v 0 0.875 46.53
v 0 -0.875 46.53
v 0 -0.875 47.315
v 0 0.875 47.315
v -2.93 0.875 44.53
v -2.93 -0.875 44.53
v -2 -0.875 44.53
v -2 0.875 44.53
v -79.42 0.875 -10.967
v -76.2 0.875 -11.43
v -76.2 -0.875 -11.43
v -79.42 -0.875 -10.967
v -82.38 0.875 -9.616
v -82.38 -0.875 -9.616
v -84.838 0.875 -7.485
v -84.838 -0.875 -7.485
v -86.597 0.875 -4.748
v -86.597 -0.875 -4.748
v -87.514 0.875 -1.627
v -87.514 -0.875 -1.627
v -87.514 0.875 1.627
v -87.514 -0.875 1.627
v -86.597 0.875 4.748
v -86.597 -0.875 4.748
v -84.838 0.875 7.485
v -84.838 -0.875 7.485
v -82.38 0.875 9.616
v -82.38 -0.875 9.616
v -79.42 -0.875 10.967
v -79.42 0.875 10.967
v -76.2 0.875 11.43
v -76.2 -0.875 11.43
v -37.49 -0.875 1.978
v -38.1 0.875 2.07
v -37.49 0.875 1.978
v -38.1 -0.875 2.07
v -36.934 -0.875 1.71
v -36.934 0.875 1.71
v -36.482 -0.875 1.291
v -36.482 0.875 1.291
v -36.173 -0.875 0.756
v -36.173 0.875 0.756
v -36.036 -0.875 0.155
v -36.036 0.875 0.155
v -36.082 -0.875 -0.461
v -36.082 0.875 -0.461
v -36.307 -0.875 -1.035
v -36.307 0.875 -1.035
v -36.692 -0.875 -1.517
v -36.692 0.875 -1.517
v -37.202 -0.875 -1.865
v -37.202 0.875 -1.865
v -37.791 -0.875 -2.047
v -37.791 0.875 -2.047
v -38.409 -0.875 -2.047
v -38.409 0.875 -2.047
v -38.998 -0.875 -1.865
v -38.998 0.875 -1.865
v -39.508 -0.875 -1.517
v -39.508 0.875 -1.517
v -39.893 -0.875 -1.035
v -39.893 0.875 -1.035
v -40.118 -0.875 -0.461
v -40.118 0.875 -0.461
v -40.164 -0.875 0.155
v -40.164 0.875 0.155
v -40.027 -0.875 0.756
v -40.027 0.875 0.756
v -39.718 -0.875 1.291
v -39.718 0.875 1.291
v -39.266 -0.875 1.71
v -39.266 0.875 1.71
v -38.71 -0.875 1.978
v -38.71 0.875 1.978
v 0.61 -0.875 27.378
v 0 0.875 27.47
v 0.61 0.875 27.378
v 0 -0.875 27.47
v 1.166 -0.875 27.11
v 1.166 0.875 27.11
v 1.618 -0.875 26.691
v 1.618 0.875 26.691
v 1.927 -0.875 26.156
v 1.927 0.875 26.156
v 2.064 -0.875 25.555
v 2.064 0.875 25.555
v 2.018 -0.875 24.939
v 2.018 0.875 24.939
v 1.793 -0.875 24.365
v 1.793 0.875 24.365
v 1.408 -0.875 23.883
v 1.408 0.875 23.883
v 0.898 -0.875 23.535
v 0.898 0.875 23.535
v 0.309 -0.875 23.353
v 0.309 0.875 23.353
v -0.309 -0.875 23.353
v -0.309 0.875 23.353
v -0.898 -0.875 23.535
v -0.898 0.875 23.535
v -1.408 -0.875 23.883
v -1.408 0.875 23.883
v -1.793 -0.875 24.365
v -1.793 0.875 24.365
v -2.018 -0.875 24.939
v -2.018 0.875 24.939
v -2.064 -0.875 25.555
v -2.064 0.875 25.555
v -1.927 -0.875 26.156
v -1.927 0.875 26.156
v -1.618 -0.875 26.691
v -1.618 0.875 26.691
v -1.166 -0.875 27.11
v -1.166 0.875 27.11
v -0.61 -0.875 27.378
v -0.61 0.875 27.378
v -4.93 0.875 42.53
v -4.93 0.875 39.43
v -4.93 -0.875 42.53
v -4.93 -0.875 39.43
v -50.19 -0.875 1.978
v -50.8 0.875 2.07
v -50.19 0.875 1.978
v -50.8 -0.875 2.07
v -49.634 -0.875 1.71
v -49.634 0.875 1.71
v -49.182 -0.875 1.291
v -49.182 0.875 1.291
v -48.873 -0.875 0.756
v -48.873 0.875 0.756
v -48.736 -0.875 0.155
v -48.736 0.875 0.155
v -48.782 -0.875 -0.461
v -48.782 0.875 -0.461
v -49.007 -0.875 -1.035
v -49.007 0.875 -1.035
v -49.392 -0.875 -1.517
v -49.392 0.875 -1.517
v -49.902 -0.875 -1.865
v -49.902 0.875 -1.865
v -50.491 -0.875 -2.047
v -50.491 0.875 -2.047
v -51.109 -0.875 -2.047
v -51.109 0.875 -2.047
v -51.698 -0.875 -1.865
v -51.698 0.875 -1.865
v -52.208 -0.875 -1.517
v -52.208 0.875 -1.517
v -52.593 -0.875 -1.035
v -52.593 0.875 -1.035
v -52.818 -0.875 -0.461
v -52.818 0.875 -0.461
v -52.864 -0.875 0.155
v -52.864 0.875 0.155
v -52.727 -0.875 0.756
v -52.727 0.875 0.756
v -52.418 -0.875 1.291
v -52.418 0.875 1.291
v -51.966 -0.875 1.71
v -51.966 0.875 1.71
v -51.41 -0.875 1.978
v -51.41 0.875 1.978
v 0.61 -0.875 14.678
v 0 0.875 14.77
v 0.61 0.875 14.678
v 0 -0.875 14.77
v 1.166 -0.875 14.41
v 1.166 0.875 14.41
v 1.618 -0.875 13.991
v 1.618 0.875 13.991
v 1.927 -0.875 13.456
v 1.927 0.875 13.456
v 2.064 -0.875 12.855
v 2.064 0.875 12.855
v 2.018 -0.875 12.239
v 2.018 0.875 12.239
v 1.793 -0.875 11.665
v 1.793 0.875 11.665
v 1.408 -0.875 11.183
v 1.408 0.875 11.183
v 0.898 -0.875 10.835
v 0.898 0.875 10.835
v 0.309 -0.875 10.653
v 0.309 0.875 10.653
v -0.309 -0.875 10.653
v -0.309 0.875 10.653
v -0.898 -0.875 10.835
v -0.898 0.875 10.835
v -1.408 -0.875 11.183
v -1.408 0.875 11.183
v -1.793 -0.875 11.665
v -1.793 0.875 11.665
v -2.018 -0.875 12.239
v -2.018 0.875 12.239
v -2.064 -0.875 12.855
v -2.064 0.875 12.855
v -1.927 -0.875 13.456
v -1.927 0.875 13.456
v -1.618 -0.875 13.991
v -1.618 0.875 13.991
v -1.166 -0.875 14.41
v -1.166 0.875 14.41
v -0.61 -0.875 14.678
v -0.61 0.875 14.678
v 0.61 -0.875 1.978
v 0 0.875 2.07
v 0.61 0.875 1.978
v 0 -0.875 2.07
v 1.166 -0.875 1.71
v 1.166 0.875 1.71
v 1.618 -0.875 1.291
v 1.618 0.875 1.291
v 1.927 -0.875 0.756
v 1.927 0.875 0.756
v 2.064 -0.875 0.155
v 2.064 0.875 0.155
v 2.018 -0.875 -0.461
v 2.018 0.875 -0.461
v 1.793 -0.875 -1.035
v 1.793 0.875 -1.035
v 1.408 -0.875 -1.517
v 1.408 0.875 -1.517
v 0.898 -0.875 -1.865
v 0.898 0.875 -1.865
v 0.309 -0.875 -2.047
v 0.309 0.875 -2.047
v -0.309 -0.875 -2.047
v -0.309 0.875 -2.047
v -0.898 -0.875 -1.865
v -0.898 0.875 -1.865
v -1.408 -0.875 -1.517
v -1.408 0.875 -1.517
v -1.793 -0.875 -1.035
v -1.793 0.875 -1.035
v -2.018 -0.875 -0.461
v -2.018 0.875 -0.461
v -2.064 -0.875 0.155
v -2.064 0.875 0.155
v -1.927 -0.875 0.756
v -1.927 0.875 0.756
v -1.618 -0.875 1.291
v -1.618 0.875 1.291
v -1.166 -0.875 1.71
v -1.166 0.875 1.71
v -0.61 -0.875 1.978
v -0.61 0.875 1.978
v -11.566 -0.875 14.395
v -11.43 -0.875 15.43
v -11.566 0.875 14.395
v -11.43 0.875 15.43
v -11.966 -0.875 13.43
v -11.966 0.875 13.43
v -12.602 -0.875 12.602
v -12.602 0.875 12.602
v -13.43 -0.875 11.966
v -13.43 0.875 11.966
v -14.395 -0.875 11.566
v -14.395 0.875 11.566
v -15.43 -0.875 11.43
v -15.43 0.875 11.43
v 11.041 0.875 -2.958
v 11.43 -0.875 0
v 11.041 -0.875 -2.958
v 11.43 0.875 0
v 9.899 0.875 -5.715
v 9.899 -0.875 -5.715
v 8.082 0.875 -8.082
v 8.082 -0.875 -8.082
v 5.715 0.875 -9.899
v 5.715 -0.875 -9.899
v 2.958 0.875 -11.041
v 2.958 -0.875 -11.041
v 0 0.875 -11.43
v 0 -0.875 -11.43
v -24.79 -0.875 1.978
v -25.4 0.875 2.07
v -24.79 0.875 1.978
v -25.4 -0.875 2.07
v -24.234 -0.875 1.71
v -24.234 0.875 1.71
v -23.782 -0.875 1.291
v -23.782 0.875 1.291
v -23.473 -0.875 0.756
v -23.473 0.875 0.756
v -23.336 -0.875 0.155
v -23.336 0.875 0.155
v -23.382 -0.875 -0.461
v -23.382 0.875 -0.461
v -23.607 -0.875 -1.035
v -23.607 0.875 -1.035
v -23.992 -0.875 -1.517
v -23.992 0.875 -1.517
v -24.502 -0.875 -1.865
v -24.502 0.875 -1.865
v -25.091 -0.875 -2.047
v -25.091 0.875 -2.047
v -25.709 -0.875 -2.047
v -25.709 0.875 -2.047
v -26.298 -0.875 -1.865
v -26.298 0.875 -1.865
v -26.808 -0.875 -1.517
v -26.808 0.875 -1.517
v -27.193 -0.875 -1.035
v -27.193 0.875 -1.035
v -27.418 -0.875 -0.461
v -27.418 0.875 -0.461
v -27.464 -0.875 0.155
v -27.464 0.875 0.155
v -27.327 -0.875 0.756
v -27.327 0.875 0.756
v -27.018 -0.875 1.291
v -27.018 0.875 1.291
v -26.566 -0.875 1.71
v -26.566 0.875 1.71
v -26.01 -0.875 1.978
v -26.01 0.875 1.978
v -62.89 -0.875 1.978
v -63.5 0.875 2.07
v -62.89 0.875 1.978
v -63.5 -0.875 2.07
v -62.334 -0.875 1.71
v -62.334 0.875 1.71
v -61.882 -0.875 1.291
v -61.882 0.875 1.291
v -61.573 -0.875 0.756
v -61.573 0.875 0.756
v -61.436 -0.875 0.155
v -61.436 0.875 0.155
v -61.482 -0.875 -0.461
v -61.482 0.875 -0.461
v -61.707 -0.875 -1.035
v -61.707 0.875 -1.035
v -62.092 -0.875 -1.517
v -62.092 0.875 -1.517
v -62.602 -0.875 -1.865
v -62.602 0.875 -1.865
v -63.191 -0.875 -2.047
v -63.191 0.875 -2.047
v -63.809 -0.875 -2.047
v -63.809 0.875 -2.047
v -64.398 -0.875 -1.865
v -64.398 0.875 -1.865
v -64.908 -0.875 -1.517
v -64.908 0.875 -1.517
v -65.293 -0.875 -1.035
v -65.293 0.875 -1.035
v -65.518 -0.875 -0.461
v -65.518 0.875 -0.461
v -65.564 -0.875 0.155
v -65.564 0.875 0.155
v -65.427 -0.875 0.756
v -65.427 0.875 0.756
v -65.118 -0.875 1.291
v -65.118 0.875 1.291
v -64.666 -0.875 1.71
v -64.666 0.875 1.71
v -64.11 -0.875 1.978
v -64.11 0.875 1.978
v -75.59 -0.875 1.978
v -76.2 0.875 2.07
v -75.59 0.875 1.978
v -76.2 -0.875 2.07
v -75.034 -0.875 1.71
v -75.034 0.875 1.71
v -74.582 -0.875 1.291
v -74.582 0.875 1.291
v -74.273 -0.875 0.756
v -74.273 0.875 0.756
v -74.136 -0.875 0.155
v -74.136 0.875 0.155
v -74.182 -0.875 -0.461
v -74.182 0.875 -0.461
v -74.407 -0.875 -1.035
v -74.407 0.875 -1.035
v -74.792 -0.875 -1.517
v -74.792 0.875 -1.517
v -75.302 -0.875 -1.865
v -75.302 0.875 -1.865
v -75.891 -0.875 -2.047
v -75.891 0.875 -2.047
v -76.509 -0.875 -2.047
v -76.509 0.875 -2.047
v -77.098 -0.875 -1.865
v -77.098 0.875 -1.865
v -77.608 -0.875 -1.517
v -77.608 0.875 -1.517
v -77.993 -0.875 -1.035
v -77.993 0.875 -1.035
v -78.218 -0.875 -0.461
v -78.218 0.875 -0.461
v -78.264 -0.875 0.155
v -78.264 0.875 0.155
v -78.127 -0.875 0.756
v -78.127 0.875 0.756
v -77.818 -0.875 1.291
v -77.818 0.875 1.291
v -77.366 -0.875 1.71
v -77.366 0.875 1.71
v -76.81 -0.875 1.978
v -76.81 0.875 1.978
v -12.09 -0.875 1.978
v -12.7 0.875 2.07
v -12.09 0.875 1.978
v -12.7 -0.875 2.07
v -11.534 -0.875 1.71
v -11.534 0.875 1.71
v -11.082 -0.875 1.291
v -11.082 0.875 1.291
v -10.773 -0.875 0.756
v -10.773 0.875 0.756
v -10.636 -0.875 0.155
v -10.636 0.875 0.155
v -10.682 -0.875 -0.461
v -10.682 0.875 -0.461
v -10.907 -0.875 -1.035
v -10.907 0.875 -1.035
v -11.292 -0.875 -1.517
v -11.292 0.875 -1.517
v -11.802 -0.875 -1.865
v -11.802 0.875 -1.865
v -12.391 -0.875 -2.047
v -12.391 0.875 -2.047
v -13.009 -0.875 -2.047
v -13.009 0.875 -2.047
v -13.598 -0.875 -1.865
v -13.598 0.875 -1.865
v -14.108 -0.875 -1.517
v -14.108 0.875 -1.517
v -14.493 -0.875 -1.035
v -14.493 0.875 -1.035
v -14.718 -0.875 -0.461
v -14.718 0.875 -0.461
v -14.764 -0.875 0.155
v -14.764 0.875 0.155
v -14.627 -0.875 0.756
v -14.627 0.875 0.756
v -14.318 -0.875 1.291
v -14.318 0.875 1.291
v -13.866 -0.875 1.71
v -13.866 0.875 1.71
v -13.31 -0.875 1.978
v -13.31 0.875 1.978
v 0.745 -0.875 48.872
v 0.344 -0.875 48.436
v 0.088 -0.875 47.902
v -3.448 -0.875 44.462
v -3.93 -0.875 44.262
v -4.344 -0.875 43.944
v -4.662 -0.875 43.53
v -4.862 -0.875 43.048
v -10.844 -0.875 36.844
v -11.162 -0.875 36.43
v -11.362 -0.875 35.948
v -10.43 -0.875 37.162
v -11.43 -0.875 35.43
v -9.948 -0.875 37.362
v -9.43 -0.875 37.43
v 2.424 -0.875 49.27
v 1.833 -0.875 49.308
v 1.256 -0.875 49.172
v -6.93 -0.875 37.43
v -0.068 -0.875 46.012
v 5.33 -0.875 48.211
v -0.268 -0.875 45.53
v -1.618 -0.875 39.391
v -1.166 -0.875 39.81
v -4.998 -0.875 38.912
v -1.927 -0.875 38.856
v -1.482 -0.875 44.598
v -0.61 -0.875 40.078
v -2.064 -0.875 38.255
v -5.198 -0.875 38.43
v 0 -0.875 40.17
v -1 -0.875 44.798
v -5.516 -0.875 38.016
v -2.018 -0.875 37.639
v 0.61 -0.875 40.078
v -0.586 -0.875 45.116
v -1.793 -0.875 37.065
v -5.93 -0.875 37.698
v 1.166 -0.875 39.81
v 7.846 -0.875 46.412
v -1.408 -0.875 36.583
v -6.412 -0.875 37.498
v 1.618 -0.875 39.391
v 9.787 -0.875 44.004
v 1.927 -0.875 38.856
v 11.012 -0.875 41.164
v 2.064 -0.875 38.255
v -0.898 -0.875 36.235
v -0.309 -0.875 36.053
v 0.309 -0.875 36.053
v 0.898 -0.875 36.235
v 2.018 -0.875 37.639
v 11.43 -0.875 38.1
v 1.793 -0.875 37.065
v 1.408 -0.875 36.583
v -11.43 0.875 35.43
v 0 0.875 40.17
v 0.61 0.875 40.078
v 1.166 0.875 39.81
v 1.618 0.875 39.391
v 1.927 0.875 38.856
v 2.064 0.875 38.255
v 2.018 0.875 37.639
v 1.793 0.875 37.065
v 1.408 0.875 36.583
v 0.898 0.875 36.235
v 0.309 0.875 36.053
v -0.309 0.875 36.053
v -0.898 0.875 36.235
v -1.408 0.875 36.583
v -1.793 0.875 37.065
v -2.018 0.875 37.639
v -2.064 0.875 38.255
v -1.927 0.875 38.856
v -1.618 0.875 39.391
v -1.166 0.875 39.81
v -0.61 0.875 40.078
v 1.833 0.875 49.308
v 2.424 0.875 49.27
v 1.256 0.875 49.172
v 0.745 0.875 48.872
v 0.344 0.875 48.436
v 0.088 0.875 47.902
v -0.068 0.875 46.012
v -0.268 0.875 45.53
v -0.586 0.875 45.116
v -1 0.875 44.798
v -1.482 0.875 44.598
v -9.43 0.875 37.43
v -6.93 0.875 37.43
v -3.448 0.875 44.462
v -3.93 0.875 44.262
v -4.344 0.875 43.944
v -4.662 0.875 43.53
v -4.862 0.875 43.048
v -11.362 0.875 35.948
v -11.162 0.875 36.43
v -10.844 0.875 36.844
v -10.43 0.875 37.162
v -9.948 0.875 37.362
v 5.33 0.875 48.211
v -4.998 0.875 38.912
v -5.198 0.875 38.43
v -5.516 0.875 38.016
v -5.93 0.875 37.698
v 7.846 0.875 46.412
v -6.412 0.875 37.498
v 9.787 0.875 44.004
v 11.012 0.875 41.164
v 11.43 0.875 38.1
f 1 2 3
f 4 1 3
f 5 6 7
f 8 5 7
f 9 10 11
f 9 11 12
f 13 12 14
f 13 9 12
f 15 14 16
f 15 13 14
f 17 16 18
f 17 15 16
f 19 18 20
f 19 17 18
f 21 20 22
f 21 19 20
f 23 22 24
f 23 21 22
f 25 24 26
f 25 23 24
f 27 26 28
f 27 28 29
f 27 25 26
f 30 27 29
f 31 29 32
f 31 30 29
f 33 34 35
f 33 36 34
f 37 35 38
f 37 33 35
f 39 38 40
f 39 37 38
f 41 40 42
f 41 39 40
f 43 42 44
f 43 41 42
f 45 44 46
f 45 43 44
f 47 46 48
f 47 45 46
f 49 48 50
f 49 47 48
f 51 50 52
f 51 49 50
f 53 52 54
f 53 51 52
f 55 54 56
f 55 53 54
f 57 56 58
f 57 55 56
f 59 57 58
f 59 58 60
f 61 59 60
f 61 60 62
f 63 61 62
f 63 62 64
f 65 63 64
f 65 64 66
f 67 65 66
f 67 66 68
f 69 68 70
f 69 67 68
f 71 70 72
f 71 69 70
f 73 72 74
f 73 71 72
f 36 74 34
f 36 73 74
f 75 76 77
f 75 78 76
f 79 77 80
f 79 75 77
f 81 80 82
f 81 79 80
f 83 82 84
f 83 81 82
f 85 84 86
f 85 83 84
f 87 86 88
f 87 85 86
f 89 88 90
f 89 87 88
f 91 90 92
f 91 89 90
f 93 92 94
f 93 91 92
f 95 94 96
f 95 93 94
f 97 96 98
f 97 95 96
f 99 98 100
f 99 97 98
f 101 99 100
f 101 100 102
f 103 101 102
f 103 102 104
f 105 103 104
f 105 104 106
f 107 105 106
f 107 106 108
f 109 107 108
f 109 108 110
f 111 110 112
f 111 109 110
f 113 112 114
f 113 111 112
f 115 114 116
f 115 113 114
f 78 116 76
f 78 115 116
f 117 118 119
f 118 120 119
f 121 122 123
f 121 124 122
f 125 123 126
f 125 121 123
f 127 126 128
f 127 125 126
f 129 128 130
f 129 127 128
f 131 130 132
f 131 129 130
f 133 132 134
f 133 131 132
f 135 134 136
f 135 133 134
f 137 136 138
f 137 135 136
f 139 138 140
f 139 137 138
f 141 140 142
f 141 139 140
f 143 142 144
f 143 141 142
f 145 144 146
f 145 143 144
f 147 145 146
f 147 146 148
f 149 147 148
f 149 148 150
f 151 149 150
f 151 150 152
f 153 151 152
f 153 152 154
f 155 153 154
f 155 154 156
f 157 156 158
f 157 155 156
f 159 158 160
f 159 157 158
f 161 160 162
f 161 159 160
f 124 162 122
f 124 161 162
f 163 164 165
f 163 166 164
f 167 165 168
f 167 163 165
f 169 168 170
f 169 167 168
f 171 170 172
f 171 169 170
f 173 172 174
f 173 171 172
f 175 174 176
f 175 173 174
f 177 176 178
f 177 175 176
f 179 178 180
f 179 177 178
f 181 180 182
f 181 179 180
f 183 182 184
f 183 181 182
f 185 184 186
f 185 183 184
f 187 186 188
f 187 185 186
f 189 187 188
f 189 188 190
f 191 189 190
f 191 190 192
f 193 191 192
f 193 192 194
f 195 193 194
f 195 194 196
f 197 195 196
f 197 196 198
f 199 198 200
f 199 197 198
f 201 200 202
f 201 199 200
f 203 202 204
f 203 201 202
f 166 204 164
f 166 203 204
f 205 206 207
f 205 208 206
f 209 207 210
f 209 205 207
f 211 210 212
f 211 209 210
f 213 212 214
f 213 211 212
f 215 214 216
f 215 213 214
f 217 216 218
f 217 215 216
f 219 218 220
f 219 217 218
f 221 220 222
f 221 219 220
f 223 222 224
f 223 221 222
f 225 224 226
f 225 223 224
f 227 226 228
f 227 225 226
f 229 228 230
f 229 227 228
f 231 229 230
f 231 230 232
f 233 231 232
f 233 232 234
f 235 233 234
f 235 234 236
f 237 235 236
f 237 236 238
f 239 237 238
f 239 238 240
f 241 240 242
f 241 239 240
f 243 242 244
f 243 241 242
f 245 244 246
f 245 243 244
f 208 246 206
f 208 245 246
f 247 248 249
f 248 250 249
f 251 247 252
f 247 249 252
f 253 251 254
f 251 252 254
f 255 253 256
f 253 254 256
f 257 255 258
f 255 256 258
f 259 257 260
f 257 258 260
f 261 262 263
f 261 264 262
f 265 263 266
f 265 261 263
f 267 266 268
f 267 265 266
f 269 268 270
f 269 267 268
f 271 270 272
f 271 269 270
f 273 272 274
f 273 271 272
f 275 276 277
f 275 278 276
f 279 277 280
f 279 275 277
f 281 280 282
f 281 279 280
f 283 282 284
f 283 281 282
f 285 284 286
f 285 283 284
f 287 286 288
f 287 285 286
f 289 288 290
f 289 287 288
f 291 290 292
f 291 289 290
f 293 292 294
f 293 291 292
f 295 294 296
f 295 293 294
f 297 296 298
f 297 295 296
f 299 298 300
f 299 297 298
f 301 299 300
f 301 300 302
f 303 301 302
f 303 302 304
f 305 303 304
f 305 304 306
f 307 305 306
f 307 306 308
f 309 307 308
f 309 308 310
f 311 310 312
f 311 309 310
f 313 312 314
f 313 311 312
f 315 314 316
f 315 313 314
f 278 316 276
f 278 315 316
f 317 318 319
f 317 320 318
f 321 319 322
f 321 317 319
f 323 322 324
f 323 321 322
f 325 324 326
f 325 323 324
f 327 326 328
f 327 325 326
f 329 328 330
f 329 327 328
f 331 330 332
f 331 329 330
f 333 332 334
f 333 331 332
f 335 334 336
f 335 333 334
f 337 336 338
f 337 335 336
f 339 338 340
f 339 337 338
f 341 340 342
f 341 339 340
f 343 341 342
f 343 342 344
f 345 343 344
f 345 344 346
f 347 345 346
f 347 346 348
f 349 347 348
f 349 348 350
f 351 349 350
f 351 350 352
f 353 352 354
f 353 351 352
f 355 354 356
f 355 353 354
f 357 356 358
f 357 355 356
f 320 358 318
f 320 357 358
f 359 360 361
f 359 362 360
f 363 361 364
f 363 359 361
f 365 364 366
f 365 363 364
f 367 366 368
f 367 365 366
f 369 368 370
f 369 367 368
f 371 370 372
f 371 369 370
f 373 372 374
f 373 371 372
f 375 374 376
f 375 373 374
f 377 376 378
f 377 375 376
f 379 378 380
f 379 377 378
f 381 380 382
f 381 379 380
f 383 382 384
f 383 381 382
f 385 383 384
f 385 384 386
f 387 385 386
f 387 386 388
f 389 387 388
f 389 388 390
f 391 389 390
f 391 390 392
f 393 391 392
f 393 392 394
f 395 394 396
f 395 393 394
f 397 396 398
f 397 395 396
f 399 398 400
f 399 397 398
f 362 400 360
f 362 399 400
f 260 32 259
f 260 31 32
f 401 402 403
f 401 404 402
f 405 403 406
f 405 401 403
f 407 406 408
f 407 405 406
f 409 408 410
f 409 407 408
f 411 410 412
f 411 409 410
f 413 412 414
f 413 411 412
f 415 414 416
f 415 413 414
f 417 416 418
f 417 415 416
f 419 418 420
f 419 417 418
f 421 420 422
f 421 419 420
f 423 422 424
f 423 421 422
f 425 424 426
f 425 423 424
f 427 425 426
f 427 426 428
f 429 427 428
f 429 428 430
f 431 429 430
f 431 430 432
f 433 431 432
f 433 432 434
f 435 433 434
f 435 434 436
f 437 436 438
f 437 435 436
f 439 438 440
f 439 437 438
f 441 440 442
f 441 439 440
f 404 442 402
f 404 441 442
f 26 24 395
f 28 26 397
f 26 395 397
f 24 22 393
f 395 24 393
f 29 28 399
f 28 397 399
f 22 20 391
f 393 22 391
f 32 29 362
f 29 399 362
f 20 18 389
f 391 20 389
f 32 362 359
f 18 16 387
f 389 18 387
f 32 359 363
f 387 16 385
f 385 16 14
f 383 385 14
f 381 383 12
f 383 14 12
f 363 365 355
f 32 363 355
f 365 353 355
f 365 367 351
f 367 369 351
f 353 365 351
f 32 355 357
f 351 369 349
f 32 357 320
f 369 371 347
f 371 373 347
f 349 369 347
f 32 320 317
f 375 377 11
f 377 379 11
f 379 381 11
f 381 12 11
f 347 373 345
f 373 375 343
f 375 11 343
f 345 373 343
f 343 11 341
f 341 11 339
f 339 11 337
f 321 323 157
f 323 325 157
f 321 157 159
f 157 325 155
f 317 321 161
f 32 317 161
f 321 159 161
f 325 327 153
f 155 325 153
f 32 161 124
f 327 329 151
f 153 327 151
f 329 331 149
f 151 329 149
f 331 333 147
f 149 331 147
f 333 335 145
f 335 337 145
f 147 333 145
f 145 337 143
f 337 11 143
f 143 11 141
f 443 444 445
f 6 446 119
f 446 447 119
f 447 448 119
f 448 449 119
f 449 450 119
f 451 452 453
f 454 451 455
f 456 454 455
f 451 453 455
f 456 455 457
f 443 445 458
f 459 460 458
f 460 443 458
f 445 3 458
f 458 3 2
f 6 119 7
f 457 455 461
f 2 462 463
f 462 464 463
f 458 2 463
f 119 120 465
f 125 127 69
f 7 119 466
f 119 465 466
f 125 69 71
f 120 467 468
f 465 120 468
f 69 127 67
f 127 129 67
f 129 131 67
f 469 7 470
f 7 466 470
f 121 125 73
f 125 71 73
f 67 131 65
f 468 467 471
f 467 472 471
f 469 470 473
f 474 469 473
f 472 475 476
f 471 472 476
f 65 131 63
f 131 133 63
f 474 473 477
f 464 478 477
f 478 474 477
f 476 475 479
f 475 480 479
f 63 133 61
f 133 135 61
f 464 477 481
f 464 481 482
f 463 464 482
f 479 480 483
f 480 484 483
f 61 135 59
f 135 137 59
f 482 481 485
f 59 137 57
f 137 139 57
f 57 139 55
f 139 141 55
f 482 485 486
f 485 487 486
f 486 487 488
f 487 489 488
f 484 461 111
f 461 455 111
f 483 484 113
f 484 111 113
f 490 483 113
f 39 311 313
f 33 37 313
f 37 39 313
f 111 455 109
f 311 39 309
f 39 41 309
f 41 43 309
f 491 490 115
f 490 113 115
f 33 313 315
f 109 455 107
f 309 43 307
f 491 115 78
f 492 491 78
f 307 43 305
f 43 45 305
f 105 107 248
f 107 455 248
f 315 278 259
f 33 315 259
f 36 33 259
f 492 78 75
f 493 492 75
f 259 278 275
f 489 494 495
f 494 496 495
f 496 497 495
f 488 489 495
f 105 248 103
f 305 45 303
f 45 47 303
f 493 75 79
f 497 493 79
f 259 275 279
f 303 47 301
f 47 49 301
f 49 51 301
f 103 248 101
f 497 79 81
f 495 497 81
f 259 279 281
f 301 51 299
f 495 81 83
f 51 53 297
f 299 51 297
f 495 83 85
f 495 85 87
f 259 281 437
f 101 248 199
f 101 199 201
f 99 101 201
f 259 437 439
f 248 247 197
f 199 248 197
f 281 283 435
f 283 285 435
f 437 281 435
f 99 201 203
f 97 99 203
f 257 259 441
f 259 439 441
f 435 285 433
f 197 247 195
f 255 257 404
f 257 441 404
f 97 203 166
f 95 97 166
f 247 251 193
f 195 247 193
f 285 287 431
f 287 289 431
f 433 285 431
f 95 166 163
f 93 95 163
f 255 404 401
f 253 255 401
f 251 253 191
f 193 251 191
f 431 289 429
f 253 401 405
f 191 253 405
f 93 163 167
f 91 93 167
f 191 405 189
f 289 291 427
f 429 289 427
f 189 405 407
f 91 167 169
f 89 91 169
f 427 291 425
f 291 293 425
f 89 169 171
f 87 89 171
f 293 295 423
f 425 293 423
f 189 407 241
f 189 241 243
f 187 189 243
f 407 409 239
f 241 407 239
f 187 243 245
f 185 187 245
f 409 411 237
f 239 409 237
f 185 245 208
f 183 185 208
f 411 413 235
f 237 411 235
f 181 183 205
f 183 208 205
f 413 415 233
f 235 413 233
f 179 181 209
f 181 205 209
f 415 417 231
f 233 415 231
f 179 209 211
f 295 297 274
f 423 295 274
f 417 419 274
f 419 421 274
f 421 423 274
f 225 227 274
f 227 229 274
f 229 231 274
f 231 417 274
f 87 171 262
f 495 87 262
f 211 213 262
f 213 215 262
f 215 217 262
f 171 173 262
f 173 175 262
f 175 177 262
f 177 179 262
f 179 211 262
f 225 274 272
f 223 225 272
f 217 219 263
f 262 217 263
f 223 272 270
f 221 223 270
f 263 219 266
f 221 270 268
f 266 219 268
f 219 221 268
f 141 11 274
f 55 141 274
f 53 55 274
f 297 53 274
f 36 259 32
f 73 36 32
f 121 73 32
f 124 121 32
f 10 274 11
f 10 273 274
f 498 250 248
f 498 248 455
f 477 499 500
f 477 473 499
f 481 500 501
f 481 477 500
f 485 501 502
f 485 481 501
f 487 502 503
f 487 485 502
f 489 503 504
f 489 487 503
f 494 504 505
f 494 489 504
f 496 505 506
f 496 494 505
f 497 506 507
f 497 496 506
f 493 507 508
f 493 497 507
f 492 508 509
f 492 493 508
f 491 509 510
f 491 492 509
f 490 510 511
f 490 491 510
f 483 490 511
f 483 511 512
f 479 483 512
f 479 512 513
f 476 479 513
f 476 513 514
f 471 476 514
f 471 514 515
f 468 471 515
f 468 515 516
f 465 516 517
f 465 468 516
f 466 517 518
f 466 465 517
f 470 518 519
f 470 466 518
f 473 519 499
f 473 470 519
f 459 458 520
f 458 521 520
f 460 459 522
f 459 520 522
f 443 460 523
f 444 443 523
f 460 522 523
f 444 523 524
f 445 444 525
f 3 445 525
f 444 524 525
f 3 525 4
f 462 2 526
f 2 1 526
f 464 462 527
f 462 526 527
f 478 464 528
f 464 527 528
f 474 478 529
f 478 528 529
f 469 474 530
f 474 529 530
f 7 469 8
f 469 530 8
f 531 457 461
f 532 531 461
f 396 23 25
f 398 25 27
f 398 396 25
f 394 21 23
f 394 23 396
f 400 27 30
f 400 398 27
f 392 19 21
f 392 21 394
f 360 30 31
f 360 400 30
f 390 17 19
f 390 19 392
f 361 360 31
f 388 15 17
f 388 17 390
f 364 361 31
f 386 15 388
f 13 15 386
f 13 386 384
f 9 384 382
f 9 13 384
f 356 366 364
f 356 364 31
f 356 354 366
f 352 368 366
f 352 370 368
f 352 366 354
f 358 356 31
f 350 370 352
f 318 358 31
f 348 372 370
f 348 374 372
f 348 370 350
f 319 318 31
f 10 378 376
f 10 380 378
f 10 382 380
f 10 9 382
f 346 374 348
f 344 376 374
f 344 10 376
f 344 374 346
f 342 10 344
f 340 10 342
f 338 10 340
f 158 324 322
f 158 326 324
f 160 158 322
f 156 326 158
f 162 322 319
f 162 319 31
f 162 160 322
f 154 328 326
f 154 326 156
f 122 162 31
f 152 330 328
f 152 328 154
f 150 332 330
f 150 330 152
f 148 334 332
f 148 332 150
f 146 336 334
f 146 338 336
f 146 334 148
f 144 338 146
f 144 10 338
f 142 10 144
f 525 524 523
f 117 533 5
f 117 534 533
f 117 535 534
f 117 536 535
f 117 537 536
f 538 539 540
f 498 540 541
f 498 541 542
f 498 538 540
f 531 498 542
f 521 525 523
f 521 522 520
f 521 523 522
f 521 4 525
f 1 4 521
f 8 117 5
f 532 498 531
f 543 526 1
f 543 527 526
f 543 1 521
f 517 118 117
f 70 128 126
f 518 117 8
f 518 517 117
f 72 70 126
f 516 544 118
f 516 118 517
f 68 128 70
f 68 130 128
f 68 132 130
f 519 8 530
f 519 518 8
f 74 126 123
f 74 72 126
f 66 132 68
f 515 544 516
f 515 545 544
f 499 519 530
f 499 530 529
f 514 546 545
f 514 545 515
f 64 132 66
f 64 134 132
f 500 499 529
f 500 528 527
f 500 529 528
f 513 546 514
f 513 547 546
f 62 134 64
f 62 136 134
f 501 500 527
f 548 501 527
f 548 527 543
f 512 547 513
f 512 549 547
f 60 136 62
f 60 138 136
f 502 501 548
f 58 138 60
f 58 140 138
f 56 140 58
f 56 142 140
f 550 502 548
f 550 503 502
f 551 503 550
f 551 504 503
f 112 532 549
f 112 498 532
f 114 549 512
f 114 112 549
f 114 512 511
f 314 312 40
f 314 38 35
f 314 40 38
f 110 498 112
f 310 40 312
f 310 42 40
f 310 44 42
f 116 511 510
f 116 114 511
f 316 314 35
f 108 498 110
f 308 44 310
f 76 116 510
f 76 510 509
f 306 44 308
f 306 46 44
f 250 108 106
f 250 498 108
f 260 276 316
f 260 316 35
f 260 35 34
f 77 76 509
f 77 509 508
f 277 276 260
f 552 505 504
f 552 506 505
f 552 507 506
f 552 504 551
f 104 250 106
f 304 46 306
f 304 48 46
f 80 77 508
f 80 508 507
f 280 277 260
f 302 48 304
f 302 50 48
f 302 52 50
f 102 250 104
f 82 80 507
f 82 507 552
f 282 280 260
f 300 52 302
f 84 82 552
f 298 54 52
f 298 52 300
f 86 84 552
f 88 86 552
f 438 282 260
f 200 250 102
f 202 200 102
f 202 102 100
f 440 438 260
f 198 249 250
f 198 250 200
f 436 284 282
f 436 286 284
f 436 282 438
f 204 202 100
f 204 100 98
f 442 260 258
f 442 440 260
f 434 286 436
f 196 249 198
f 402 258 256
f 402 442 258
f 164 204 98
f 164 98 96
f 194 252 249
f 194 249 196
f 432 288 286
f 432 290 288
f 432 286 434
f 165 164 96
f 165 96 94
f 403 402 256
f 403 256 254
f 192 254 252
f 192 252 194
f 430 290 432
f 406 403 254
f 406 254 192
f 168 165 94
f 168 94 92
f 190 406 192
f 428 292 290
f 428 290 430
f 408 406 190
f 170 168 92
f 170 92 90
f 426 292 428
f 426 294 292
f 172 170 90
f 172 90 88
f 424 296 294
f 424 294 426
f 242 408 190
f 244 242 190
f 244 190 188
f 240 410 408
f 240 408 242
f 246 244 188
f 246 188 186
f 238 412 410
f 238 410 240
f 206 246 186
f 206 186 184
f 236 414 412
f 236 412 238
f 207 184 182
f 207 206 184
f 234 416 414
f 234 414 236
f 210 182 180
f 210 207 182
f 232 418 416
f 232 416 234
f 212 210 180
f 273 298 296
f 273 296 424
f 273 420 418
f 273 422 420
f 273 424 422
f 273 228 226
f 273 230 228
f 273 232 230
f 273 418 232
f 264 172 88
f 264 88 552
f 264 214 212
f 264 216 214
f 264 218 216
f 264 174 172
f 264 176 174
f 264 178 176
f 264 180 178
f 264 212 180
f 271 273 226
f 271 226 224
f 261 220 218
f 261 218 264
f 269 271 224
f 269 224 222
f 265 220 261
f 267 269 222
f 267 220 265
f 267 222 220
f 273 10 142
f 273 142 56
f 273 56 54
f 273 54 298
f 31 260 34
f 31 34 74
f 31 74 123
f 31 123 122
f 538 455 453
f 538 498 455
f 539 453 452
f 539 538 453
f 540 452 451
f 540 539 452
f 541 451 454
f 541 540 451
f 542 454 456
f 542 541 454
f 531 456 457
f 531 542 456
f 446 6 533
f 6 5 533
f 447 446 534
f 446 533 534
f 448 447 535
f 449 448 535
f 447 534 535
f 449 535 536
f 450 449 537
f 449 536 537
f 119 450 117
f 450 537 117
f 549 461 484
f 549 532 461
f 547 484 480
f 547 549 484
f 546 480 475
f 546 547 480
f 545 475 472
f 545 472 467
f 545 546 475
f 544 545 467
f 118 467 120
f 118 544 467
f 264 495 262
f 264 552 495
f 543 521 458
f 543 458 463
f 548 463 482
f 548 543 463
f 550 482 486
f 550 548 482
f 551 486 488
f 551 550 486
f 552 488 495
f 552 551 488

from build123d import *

# Parameters (mm, degrees)
SKETCH1_R               = 2.07
BOSS_EXTRUDE1_DEPTH     = 0.875
FILLET1_R               = 4
CUT_EXTRUDE3_DEPTH      = 101.674228579
CUT_EXTRUDE3_DEPTH_BACK = 101.674228579
CUT_EXTRUDE4_DEPTH      = 101.674228579
CUT_EXTRUDE4_DEPTH_BACK = 101.674228579
FILLET3_R               = 2


with BuildPart() as part:
    # Sketch1 → Boss-Extrude1 (new, symmetric)
    with BuildSketch(Plane(origin=(0, 0, 0), x_dir=(1, 0, 0), z_dir=(0, 1, 0))):
        with BuildLine():
            Line((0, 11.43), (-76.2, 11.43))
            ThreePointArc((-76.2, 11.43), (-87.63, 0), (-76.2, -11.43))
            Line((-76.2, -11.43), (-11.43, -11.43))
            Line((-11.43, -11.43), (-11.43, -38.1))
            ThreePointArc((-11.43, -38.1), (0, -49.53), (11.43, -38.1))
            Line((11.43, -38.1), (11.43, 0))
            ThreePointArc((11.43, 0), (8.082230509, 8.082230509), (0, 11.43))
        make_face()
        with Locations(Location((0, -25.4, 0), (0, 0, 270))):
            Circle(SKETCH1_R, mode=Mode.SUBTRACT)
        with Locations(Location((0, -12.7, 0), (0, 0, 270))):
            Circle(SKETCH1_R, mode=Mode.SUBTRACT)
        with Locations(Location((-12.7, 0, 0), (0, 0, 270))):
            Circle(SKETCH1_R, mode=Mode.SUBTRACT)
        with Locations(Location((-63.5, 0, 0), (0, 0, 270))):
            Circle(SKETCH1_R, mode=Mode.SUBTRACT)
        with Locations(Location((-50.8, 0, 0), (0, 0, 270))):
            Circle(SKETCH1_R, mode=Mode.SUBTRACT)
        with Locations(Location((-38.1, 0, 0), (0, 0, 270))):
            Circle(SKETCH1_R, mode=Mode.SUBTRACT)
        with Locations(Location((-25.4, 0, 0), (0, 0, 270))):
            Circle(SKETCH1_R, mode=Mode.SUBTRACT)
        with Locations(Location((-76.2, 0, 0), (0, 0, 270))):
            Circle(SKETCH1_R, mode=Mode.SUBTRACT)
        with Locations(Location((0, 0, 0), (0, 0, 270))):
            Circle(SKETCH1_R, mode=Mode.SUBTRACT)
        with Locations(Location((0, -38.1, 0), (0, 0, 270))):
            Circle(SKETCH1_R, mode=Mode.SUBTRACT)
    extrude(amount=BOSS_EXTRUDE1_DEPTH, both=True)

    # Fillet1
    fillet1_edges = [part.edges().sort_by_distance(p)[0] for p in [
        (-11.43, 0, 11.43),
    ]]
    fillet(fillet1_edges, radius=FILLET1_R)

    # Sketch4 → Cut-Extrude3 (cut, two sides: drawn at the far end of the back side and taken through both)
    with BuildSketch(Plane(origin=(0, 0.875, 0), x_dir=(1, 0, 0), z_dir=(0, 1, 0)).offset(-CUT_EXTRUDE3_DEPTH_BACK)):
        with BuildLine():
            Line((-4.93, -37.43), (-4.93, -48.412128781))
            ThreePointArc((-4.93, -48.412128781), (-9.669405359, -44.194874896), (-11.43, -38.1))
            Line((-11.43, -38.1), (-11.43, -37.43))
            Line((-11.43, -37.43), (-4.93, -37.43))
        make_face()
    extrude(amount=CUT_EXTRUDE3_DEPTH + CUT_EXTRUDE3_DEPTH_BACK, mode=Mode.SUBTRACT)

    # Sketch5 → Cut-Extrude4 (cut, two sides: drawn at the far end of the back side and taken through both)
    with BuildSketch(Plane(origin=(0, 0.875, 0), x_dir=(1, 0, 0), z_dir=(0, 1, 0)).offset(-CUT_EXTRUDE4_DEPTH_BACK)):
        with BuildLine():
            Line((-4.93, -44.53), (0, -44.53))
            Line((0, -44.53), (0, -49.53))
            ThreePointArc((0, -49.53), (-2.52757473, -49.247029469), (-4.93, -48.412128781))
            Line((-4.93, -48.412128781), (-4.93, -44.53))
        make_face()
    extrude(amount=CUT_EXTRUDE4_DEPTH + CUT_EXTRUDE4_DEPTH_BACK, mode=Mode.SUBTRACT)

    # Fillet3
    fillet3_edges = [part.edges().sort_by_distance(p)[0] for p in [
        (0, 0, 49.53),
        (0, 0, 44.53),
        (-4.93, 0, 44.53),
        (-4.93, 0, 37.43),
        (-11.43, 0, 37.43),
    ]]
    fillet(fillet3_edges, radius=FILLET3_R)


solid = part.part
